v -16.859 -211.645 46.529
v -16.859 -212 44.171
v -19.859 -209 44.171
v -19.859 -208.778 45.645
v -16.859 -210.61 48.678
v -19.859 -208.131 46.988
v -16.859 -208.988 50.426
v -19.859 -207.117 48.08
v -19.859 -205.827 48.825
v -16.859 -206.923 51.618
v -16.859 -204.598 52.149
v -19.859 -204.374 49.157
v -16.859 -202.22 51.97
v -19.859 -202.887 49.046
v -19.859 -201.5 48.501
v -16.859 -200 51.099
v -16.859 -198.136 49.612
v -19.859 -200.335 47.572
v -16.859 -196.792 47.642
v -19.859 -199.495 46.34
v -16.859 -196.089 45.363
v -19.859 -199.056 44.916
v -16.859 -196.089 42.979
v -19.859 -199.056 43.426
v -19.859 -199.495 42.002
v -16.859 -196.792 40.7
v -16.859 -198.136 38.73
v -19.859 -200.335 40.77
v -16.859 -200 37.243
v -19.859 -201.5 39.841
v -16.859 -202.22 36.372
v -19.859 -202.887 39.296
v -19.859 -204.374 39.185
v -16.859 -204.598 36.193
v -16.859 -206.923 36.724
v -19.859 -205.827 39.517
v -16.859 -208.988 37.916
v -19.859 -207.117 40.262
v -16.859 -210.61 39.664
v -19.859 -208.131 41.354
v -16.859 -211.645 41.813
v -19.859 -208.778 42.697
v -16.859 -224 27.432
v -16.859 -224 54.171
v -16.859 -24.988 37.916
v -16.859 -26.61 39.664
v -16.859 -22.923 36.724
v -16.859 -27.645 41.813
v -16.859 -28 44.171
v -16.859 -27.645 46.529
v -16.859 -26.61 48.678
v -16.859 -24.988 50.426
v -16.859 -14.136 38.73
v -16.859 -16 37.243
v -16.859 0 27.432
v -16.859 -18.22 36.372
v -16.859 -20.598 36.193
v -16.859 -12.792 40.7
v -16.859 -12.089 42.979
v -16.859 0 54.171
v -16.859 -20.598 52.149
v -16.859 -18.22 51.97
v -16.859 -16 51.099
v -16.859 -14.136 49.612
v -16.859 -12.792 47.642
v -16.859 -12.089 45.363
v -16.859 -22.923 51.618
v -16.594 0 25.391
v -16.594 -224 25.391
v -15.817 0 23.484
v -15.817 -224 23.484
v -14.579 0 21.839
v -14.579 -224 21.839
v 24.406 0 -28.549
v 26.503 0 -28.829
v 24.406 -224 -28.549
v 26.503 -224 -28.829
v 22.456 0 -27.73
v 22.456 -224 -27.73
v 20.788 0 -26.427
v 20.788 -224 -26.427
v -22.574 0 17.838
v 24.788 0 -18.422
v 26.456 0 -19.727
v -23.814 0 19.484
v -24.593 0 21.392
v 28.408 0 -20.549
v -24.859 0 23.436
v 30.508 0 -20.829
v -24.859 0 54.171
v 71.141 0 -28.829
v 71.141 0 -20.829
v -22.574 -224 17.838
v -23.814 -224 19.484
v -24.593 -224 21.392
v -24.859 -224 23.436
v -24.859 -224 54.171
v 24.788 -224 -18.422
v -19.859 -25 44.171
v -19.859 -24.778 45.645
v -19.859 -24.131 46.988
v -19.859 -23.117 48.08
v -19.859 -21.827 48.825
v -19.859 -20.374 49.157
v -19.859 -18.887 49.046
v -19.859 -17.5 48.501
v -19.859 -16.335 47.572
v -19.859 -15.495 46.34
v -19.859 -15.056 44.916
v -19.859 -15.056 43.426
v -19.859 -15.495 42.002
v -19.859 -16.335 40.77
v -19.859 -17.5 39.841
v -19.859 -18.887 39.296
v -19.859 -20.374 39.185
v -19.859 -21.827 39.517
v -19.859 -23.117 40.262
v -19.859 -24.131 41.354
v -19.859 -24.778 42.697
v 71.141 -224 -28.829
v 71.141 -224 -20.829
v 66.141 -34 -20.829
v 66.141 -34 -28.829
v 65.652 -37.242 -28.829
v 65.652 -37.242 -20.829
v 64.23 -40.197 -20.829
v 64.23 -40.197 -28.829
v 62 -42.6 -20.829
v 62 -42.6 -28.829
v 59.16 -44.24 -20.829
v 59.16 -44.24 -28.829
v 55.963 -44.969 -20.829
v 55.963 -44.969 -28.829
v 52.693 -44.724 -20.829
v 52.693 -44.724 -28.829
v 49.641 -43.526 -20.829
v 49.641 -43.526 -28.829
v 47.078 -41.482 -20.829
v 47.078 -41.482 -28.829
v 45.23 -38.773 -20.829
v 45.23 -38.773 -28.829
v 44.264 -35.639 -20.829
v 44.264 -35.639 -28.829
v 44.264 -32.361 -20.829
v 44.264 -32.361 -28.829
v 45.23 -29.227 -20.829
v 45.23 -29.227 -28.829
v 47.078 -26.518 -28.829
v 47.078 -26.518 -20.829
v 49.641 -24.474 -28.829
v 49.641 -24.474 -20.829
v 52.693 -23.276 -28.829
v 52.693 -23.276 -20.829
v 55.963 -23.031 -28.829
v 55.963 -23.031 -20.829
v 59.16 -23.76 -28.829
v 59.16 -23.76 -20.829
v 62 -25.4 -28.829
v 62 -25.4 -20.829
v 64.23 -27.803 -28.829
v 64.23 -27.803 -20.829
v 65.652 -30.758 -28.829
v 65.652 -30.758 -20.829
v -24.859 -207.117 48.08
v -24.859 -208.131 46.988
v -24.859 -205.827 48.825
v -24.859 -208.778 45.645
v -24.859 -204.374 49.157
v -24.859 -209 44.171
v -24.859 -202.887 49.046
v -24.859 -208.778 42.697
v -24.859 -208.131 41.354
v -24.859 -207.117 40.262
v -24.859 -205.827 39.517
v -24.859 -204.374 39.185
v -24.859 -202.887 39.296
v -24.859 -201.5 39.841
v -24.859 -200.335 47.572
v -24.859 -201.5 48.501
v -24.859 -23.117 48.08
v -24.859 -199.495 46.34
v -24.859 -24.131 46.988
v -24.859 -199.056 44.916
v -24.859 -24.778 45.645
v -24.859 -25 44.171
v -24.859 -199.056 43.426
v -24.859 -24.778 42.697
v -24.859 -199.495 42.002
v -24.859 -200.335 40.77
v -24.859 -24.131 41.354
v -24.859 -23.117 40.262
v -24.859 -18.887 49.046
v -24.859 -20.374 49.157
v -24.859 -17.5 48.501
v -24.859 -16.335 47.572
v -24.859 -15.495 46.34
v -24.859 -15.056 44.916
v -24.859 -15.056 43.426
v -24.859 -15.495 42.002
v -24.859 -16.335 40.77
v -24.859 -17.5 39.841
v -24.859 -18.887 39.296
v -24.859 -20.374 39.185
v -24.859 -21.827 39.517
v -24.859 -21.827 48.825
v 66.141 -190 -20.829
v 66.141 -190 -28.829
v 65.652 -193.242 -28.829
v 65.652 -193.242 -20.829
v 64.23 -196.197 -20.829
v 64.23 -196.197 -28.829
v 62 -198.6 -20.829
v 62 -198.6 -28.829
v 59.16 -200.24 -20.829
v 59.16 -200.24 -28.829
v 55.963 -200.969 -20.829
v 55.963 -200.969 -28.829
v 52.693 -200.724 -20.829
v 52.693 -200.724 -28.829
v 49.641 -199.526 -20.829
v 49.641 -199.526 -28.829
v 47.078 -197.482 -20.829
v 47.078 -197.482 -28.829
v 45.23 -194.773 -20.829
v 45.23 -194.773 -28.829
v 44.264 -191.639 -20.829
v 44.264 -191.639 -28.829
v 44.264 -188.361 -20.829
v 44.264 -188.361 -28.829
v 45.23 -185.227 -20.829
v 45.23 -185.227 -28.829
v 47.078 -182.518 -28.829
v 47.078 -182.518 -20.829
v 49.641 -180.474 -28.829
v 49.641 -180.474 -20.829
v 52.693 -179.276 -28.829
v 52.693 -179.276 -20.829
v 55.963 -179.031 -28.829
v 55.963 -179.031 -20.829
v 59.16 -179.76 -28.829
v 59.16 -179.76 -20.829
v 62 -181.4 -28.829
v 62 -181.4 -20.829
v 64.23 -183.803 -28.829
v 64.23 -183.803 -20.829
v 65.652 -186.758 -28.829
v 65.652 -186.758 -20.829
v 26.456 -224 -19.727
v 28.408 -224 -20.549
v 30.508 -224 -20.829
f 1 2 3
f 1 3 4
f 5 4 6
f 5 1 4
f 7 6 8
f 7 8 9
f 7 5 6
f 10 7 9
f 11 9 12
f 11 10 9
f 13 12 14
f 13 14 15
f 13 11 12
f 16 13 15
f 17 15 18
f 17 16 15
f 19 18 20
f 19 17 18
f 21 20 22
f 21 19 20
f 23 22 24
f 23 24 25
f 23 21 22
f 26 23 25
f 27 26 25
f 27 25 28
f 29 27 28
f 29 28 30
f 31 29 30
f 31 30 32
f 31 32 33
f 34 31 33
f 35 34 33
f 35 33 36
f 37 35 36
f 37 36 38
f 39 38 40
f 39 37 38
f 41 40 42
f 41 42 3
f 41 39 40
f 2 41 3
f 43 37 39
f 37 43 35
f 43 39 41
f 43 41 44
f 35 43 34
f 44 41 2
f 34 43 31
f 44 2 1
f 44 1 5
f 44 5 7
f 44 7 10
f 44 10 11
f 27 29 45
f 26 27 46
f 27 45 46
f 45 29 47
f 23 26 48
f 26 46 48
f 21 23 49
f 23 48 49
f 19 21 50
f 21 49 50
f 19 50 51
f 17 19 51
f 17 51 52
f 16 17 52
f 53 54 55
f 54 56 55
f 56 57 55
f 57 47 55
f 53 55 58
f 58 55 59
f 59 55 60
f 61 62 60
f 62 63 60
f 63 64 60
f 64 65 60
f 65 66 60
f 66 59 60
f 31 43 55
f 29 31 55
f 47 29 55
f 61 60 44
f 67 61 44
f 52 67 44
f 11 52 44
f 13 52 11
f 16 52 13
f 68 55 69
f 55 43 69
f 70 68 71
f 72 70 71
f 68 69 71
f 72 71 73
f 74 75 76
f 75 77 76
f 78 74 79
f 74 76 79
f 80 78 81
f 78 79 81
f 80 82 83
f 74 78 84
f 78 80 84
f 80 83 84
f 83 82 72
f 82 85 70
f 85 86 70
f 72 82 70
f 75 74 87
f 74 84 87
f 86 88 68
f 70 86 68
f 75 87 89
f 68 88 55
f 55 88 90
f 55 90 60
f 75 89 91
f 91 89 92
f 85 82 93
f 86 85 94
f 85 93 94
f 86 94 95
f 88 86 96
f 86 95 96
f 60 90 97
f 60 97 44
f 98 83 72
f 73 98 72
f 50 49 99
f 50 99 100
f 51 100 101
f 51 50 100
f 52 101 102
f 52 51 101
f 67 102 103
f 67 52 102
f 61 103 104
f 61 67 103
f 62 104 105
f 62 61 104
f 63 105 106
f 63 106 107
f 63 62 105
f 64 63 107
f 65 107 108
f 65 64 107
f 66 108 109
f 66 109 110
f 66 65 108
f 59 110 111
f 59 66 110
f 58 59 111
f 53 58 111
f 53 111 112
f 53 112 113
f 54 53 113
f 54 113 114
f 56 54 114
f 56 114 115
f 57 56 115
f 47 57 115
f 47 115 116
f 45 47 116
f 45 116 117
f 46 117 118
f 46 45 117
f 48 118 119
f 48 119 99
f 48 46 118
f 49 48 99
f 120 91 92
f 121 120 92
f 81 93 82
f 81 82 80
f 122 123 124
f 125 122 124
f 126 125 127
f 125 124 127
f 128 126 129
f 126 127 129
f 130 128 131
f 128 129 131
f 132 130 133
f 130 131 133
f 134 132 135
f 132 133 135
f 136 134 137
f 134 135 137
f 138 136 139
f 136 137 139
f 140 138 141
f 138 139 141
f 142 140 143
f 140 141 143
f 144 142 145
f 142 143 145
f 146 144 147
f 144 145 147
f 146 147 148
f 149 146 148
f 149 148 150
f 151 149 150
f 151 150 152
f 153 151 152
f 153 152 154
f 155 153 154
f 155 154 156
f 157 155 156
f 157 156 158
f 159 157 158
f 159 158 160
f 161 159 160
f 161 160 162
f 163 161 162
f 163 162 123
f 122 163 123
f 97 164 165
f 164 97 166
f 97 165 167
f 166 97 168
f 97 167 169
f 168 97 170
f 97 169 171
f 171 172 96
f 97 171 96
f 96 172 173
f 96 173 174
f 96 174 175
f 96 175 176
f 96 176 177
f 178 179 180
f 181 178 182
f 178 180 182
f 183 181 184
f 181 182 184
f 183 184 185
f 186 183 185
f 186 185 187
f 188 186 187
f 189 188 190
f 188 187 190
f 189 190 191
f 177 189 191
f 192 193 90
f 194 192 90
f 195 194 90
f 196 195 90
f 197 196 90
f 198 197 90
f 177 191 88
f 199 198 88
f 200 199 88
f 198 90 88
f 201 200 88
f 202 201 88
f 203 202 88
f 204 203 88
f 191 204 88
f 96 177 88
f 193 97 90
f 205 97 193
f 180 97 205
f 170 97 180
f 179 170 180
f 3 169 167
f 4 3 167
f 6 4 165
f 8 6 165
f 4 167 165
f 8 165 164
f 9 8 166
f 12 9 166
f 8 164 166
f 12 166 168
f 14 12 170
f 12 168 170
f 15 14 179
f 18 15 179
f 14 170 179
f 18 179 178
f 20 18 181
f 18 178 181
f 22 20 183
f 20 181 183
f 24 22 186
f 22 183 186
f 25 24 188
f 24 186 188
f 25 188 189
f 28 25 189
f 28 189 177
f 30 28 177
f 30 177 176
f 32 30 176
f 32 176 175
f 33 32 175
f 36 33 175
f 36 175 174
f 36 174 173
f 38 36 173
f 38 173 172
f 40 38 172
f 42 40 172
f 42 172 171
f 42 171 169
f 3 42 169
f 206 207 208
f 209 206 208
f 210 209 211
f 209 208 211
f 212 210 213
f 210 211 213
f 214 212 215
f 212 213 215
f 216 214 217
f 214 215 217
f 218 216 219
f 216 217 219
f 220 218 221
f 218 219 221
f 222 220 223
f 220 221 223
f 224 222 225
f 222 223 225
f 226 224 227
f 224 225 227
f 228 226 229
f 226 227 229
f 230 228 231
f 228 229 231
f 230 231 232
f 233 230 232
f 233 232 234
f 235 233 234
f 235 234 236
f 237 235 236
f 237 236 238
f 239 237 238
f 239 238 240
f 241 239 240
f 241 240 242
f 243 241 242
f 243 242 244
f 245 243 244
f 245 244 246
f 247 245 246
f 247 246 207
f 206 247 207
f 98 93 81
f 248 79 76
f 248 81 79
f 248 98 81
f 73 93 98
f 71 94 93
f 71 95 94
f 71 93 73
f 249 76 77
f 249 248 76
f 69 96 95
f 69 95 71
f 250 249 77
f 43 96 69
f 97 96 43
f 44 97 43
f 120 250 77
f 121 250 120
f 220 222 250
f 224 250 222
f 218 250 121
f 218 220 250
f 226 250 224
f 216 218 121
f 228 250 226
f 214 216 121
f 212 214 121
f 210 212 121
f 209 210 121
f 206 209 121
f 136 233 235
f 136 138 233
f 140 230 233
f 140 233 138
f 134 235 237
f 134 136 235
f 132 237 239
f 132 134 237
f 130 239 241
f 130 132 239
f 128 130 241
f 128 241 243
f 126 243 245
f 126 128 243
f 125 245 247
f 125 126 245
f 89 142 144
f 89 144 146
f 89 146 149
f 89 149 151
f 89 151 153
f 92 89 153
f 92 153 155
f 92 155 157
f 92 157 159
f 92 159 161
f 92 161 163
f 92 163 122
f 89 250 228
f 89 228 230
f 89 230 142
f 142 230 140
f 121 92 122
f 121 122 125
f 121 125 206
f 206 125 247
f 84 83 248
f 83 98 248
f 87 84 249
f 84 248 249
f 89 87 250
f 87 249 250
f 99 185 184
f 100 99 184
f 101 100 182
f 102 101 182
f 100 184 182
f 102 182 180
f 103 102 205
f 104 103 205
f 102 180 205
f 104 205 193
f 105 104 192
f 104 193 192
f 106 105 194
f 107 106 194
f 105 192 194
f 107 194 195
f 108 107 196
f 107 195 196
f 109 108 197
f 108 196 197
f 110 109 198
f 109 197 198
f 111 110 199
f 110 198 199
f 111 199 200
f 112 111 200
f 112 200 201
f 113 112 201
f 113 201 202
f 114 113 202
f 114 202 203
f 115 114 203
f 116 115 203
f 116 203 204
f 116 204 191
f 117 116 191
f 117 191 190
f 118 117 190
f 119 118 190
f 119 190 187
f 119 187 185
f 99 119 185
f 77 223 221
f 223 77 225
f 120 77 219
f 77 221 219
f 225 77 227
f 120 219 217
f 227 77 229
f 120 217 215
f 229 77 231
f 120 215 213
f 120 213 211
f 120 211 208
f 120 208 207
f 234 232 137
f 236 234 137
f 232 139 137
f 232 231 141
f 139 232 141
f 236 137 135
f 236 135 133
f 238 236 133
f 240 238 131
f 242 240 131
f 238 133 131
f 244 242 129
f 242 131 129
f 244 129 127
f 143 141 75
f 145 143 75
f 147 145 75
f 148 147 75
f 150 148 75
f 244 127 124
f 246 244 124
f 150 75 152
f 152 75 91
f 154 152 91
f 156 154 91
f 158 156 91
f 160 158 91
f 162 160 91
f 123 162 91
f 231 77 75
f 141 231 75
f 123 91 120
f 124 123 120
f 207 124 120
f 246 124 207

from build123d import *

# Parameters (mm, degrees)
F0_W     = 8
F0_H     = 30
F0_W_2   = 44
F0_H_2   = 8
F1_DEPTH = 224
F2_R     = 5
F3_DEPTH = 25
F4_R     = 11
F5_DEPTH = 25
F6_SIZE  = 3
F7_R     = 8
F8_R     = 8


with BuildPart() as f1:
    # F0 (on Front) → F1 (new body)
    with BuildSketch(Plane.XZ):
        with Locations((-20.8588695079, 39.1709680259)):
            Rectangle(F0_W, F0_H)
        Polygon((-16.8588695079, 24.1709680259), (-24.8588695079, 24.1709680259), (-24.8588695079, 20.1709680259), align=None)
        Polygon((27.1411304921, -20.8290319741), (-16.8588695079, 24.1709680259), (-24.8588695079, 20.1709680259), (23.1411304921, -28.8290319741), align=None)
        with Locations((49.1411304921, -24.8290319741)):
            Rectangle(F0_W_2, F0_H_2)
        Polygon((27.1411304921, -28.8290319741), (27.1411304921, -20.8290319741), (23.1411304921, -28.8290319741), align=None)
    extrude(amount=F1_DEPTH)

    # F2 (on face) → F3 (cut)
    with BuildSketch(Plane(origin=(-24.8588695079, 0, 0), x_dir=(0, -1, 0), z_dir=(-1, 0, 0))):
        with Locations((20, 44.1709680259)):
            Circle(F2_R)
        with Locations((204, 44.1709680259)):
            Circle(F2_R)
    extrude(amount=-F3_DEPTH, mode=Mode.SUBTRACT)

    # F4 (on face) → F5 (cut)
    with BuildSketch(Plane(origin=(0, 0, -28.8290319741), x_dir=(1, 0, 0), z_dir=(0, 0, -1))):
        with Locations((55.1411304921, 34)):
            Circle(F4_R)
        with Locations((55.1411304921, 190)):
            Circle(F4_R)
    extrude(amount=-F5_DEPTH, mode=Mode.SUBTRACT)

    # F6
    f6_edges = [f1.edges().sort_by_distance(p)[0] for p in [
        (-16.85887, -199, 44.170968),
        (-16.85887, -15, 44.170968),
    ]]
    chamfer(f6_edges, length=F6_SIZE)

    # F7
    f7_edges = [f1.edges().sort_by_distance(p)[0] for p in [
        (-16.85887, -112, 24.170968),
        (27.14113, -112, -20.829032),
    ]]
    fillet(f7_edges, radius=F7_R)

    # F8
    f8_edges = [f1.edges().sort_by_distance(p)[0] for p in [
        (-24.85887, -112, 20.170968),
        (23.14113, -112, -28.829032),
    ]]
    fillet(f8_edges, radius=F8_R)


solid = f1.part
